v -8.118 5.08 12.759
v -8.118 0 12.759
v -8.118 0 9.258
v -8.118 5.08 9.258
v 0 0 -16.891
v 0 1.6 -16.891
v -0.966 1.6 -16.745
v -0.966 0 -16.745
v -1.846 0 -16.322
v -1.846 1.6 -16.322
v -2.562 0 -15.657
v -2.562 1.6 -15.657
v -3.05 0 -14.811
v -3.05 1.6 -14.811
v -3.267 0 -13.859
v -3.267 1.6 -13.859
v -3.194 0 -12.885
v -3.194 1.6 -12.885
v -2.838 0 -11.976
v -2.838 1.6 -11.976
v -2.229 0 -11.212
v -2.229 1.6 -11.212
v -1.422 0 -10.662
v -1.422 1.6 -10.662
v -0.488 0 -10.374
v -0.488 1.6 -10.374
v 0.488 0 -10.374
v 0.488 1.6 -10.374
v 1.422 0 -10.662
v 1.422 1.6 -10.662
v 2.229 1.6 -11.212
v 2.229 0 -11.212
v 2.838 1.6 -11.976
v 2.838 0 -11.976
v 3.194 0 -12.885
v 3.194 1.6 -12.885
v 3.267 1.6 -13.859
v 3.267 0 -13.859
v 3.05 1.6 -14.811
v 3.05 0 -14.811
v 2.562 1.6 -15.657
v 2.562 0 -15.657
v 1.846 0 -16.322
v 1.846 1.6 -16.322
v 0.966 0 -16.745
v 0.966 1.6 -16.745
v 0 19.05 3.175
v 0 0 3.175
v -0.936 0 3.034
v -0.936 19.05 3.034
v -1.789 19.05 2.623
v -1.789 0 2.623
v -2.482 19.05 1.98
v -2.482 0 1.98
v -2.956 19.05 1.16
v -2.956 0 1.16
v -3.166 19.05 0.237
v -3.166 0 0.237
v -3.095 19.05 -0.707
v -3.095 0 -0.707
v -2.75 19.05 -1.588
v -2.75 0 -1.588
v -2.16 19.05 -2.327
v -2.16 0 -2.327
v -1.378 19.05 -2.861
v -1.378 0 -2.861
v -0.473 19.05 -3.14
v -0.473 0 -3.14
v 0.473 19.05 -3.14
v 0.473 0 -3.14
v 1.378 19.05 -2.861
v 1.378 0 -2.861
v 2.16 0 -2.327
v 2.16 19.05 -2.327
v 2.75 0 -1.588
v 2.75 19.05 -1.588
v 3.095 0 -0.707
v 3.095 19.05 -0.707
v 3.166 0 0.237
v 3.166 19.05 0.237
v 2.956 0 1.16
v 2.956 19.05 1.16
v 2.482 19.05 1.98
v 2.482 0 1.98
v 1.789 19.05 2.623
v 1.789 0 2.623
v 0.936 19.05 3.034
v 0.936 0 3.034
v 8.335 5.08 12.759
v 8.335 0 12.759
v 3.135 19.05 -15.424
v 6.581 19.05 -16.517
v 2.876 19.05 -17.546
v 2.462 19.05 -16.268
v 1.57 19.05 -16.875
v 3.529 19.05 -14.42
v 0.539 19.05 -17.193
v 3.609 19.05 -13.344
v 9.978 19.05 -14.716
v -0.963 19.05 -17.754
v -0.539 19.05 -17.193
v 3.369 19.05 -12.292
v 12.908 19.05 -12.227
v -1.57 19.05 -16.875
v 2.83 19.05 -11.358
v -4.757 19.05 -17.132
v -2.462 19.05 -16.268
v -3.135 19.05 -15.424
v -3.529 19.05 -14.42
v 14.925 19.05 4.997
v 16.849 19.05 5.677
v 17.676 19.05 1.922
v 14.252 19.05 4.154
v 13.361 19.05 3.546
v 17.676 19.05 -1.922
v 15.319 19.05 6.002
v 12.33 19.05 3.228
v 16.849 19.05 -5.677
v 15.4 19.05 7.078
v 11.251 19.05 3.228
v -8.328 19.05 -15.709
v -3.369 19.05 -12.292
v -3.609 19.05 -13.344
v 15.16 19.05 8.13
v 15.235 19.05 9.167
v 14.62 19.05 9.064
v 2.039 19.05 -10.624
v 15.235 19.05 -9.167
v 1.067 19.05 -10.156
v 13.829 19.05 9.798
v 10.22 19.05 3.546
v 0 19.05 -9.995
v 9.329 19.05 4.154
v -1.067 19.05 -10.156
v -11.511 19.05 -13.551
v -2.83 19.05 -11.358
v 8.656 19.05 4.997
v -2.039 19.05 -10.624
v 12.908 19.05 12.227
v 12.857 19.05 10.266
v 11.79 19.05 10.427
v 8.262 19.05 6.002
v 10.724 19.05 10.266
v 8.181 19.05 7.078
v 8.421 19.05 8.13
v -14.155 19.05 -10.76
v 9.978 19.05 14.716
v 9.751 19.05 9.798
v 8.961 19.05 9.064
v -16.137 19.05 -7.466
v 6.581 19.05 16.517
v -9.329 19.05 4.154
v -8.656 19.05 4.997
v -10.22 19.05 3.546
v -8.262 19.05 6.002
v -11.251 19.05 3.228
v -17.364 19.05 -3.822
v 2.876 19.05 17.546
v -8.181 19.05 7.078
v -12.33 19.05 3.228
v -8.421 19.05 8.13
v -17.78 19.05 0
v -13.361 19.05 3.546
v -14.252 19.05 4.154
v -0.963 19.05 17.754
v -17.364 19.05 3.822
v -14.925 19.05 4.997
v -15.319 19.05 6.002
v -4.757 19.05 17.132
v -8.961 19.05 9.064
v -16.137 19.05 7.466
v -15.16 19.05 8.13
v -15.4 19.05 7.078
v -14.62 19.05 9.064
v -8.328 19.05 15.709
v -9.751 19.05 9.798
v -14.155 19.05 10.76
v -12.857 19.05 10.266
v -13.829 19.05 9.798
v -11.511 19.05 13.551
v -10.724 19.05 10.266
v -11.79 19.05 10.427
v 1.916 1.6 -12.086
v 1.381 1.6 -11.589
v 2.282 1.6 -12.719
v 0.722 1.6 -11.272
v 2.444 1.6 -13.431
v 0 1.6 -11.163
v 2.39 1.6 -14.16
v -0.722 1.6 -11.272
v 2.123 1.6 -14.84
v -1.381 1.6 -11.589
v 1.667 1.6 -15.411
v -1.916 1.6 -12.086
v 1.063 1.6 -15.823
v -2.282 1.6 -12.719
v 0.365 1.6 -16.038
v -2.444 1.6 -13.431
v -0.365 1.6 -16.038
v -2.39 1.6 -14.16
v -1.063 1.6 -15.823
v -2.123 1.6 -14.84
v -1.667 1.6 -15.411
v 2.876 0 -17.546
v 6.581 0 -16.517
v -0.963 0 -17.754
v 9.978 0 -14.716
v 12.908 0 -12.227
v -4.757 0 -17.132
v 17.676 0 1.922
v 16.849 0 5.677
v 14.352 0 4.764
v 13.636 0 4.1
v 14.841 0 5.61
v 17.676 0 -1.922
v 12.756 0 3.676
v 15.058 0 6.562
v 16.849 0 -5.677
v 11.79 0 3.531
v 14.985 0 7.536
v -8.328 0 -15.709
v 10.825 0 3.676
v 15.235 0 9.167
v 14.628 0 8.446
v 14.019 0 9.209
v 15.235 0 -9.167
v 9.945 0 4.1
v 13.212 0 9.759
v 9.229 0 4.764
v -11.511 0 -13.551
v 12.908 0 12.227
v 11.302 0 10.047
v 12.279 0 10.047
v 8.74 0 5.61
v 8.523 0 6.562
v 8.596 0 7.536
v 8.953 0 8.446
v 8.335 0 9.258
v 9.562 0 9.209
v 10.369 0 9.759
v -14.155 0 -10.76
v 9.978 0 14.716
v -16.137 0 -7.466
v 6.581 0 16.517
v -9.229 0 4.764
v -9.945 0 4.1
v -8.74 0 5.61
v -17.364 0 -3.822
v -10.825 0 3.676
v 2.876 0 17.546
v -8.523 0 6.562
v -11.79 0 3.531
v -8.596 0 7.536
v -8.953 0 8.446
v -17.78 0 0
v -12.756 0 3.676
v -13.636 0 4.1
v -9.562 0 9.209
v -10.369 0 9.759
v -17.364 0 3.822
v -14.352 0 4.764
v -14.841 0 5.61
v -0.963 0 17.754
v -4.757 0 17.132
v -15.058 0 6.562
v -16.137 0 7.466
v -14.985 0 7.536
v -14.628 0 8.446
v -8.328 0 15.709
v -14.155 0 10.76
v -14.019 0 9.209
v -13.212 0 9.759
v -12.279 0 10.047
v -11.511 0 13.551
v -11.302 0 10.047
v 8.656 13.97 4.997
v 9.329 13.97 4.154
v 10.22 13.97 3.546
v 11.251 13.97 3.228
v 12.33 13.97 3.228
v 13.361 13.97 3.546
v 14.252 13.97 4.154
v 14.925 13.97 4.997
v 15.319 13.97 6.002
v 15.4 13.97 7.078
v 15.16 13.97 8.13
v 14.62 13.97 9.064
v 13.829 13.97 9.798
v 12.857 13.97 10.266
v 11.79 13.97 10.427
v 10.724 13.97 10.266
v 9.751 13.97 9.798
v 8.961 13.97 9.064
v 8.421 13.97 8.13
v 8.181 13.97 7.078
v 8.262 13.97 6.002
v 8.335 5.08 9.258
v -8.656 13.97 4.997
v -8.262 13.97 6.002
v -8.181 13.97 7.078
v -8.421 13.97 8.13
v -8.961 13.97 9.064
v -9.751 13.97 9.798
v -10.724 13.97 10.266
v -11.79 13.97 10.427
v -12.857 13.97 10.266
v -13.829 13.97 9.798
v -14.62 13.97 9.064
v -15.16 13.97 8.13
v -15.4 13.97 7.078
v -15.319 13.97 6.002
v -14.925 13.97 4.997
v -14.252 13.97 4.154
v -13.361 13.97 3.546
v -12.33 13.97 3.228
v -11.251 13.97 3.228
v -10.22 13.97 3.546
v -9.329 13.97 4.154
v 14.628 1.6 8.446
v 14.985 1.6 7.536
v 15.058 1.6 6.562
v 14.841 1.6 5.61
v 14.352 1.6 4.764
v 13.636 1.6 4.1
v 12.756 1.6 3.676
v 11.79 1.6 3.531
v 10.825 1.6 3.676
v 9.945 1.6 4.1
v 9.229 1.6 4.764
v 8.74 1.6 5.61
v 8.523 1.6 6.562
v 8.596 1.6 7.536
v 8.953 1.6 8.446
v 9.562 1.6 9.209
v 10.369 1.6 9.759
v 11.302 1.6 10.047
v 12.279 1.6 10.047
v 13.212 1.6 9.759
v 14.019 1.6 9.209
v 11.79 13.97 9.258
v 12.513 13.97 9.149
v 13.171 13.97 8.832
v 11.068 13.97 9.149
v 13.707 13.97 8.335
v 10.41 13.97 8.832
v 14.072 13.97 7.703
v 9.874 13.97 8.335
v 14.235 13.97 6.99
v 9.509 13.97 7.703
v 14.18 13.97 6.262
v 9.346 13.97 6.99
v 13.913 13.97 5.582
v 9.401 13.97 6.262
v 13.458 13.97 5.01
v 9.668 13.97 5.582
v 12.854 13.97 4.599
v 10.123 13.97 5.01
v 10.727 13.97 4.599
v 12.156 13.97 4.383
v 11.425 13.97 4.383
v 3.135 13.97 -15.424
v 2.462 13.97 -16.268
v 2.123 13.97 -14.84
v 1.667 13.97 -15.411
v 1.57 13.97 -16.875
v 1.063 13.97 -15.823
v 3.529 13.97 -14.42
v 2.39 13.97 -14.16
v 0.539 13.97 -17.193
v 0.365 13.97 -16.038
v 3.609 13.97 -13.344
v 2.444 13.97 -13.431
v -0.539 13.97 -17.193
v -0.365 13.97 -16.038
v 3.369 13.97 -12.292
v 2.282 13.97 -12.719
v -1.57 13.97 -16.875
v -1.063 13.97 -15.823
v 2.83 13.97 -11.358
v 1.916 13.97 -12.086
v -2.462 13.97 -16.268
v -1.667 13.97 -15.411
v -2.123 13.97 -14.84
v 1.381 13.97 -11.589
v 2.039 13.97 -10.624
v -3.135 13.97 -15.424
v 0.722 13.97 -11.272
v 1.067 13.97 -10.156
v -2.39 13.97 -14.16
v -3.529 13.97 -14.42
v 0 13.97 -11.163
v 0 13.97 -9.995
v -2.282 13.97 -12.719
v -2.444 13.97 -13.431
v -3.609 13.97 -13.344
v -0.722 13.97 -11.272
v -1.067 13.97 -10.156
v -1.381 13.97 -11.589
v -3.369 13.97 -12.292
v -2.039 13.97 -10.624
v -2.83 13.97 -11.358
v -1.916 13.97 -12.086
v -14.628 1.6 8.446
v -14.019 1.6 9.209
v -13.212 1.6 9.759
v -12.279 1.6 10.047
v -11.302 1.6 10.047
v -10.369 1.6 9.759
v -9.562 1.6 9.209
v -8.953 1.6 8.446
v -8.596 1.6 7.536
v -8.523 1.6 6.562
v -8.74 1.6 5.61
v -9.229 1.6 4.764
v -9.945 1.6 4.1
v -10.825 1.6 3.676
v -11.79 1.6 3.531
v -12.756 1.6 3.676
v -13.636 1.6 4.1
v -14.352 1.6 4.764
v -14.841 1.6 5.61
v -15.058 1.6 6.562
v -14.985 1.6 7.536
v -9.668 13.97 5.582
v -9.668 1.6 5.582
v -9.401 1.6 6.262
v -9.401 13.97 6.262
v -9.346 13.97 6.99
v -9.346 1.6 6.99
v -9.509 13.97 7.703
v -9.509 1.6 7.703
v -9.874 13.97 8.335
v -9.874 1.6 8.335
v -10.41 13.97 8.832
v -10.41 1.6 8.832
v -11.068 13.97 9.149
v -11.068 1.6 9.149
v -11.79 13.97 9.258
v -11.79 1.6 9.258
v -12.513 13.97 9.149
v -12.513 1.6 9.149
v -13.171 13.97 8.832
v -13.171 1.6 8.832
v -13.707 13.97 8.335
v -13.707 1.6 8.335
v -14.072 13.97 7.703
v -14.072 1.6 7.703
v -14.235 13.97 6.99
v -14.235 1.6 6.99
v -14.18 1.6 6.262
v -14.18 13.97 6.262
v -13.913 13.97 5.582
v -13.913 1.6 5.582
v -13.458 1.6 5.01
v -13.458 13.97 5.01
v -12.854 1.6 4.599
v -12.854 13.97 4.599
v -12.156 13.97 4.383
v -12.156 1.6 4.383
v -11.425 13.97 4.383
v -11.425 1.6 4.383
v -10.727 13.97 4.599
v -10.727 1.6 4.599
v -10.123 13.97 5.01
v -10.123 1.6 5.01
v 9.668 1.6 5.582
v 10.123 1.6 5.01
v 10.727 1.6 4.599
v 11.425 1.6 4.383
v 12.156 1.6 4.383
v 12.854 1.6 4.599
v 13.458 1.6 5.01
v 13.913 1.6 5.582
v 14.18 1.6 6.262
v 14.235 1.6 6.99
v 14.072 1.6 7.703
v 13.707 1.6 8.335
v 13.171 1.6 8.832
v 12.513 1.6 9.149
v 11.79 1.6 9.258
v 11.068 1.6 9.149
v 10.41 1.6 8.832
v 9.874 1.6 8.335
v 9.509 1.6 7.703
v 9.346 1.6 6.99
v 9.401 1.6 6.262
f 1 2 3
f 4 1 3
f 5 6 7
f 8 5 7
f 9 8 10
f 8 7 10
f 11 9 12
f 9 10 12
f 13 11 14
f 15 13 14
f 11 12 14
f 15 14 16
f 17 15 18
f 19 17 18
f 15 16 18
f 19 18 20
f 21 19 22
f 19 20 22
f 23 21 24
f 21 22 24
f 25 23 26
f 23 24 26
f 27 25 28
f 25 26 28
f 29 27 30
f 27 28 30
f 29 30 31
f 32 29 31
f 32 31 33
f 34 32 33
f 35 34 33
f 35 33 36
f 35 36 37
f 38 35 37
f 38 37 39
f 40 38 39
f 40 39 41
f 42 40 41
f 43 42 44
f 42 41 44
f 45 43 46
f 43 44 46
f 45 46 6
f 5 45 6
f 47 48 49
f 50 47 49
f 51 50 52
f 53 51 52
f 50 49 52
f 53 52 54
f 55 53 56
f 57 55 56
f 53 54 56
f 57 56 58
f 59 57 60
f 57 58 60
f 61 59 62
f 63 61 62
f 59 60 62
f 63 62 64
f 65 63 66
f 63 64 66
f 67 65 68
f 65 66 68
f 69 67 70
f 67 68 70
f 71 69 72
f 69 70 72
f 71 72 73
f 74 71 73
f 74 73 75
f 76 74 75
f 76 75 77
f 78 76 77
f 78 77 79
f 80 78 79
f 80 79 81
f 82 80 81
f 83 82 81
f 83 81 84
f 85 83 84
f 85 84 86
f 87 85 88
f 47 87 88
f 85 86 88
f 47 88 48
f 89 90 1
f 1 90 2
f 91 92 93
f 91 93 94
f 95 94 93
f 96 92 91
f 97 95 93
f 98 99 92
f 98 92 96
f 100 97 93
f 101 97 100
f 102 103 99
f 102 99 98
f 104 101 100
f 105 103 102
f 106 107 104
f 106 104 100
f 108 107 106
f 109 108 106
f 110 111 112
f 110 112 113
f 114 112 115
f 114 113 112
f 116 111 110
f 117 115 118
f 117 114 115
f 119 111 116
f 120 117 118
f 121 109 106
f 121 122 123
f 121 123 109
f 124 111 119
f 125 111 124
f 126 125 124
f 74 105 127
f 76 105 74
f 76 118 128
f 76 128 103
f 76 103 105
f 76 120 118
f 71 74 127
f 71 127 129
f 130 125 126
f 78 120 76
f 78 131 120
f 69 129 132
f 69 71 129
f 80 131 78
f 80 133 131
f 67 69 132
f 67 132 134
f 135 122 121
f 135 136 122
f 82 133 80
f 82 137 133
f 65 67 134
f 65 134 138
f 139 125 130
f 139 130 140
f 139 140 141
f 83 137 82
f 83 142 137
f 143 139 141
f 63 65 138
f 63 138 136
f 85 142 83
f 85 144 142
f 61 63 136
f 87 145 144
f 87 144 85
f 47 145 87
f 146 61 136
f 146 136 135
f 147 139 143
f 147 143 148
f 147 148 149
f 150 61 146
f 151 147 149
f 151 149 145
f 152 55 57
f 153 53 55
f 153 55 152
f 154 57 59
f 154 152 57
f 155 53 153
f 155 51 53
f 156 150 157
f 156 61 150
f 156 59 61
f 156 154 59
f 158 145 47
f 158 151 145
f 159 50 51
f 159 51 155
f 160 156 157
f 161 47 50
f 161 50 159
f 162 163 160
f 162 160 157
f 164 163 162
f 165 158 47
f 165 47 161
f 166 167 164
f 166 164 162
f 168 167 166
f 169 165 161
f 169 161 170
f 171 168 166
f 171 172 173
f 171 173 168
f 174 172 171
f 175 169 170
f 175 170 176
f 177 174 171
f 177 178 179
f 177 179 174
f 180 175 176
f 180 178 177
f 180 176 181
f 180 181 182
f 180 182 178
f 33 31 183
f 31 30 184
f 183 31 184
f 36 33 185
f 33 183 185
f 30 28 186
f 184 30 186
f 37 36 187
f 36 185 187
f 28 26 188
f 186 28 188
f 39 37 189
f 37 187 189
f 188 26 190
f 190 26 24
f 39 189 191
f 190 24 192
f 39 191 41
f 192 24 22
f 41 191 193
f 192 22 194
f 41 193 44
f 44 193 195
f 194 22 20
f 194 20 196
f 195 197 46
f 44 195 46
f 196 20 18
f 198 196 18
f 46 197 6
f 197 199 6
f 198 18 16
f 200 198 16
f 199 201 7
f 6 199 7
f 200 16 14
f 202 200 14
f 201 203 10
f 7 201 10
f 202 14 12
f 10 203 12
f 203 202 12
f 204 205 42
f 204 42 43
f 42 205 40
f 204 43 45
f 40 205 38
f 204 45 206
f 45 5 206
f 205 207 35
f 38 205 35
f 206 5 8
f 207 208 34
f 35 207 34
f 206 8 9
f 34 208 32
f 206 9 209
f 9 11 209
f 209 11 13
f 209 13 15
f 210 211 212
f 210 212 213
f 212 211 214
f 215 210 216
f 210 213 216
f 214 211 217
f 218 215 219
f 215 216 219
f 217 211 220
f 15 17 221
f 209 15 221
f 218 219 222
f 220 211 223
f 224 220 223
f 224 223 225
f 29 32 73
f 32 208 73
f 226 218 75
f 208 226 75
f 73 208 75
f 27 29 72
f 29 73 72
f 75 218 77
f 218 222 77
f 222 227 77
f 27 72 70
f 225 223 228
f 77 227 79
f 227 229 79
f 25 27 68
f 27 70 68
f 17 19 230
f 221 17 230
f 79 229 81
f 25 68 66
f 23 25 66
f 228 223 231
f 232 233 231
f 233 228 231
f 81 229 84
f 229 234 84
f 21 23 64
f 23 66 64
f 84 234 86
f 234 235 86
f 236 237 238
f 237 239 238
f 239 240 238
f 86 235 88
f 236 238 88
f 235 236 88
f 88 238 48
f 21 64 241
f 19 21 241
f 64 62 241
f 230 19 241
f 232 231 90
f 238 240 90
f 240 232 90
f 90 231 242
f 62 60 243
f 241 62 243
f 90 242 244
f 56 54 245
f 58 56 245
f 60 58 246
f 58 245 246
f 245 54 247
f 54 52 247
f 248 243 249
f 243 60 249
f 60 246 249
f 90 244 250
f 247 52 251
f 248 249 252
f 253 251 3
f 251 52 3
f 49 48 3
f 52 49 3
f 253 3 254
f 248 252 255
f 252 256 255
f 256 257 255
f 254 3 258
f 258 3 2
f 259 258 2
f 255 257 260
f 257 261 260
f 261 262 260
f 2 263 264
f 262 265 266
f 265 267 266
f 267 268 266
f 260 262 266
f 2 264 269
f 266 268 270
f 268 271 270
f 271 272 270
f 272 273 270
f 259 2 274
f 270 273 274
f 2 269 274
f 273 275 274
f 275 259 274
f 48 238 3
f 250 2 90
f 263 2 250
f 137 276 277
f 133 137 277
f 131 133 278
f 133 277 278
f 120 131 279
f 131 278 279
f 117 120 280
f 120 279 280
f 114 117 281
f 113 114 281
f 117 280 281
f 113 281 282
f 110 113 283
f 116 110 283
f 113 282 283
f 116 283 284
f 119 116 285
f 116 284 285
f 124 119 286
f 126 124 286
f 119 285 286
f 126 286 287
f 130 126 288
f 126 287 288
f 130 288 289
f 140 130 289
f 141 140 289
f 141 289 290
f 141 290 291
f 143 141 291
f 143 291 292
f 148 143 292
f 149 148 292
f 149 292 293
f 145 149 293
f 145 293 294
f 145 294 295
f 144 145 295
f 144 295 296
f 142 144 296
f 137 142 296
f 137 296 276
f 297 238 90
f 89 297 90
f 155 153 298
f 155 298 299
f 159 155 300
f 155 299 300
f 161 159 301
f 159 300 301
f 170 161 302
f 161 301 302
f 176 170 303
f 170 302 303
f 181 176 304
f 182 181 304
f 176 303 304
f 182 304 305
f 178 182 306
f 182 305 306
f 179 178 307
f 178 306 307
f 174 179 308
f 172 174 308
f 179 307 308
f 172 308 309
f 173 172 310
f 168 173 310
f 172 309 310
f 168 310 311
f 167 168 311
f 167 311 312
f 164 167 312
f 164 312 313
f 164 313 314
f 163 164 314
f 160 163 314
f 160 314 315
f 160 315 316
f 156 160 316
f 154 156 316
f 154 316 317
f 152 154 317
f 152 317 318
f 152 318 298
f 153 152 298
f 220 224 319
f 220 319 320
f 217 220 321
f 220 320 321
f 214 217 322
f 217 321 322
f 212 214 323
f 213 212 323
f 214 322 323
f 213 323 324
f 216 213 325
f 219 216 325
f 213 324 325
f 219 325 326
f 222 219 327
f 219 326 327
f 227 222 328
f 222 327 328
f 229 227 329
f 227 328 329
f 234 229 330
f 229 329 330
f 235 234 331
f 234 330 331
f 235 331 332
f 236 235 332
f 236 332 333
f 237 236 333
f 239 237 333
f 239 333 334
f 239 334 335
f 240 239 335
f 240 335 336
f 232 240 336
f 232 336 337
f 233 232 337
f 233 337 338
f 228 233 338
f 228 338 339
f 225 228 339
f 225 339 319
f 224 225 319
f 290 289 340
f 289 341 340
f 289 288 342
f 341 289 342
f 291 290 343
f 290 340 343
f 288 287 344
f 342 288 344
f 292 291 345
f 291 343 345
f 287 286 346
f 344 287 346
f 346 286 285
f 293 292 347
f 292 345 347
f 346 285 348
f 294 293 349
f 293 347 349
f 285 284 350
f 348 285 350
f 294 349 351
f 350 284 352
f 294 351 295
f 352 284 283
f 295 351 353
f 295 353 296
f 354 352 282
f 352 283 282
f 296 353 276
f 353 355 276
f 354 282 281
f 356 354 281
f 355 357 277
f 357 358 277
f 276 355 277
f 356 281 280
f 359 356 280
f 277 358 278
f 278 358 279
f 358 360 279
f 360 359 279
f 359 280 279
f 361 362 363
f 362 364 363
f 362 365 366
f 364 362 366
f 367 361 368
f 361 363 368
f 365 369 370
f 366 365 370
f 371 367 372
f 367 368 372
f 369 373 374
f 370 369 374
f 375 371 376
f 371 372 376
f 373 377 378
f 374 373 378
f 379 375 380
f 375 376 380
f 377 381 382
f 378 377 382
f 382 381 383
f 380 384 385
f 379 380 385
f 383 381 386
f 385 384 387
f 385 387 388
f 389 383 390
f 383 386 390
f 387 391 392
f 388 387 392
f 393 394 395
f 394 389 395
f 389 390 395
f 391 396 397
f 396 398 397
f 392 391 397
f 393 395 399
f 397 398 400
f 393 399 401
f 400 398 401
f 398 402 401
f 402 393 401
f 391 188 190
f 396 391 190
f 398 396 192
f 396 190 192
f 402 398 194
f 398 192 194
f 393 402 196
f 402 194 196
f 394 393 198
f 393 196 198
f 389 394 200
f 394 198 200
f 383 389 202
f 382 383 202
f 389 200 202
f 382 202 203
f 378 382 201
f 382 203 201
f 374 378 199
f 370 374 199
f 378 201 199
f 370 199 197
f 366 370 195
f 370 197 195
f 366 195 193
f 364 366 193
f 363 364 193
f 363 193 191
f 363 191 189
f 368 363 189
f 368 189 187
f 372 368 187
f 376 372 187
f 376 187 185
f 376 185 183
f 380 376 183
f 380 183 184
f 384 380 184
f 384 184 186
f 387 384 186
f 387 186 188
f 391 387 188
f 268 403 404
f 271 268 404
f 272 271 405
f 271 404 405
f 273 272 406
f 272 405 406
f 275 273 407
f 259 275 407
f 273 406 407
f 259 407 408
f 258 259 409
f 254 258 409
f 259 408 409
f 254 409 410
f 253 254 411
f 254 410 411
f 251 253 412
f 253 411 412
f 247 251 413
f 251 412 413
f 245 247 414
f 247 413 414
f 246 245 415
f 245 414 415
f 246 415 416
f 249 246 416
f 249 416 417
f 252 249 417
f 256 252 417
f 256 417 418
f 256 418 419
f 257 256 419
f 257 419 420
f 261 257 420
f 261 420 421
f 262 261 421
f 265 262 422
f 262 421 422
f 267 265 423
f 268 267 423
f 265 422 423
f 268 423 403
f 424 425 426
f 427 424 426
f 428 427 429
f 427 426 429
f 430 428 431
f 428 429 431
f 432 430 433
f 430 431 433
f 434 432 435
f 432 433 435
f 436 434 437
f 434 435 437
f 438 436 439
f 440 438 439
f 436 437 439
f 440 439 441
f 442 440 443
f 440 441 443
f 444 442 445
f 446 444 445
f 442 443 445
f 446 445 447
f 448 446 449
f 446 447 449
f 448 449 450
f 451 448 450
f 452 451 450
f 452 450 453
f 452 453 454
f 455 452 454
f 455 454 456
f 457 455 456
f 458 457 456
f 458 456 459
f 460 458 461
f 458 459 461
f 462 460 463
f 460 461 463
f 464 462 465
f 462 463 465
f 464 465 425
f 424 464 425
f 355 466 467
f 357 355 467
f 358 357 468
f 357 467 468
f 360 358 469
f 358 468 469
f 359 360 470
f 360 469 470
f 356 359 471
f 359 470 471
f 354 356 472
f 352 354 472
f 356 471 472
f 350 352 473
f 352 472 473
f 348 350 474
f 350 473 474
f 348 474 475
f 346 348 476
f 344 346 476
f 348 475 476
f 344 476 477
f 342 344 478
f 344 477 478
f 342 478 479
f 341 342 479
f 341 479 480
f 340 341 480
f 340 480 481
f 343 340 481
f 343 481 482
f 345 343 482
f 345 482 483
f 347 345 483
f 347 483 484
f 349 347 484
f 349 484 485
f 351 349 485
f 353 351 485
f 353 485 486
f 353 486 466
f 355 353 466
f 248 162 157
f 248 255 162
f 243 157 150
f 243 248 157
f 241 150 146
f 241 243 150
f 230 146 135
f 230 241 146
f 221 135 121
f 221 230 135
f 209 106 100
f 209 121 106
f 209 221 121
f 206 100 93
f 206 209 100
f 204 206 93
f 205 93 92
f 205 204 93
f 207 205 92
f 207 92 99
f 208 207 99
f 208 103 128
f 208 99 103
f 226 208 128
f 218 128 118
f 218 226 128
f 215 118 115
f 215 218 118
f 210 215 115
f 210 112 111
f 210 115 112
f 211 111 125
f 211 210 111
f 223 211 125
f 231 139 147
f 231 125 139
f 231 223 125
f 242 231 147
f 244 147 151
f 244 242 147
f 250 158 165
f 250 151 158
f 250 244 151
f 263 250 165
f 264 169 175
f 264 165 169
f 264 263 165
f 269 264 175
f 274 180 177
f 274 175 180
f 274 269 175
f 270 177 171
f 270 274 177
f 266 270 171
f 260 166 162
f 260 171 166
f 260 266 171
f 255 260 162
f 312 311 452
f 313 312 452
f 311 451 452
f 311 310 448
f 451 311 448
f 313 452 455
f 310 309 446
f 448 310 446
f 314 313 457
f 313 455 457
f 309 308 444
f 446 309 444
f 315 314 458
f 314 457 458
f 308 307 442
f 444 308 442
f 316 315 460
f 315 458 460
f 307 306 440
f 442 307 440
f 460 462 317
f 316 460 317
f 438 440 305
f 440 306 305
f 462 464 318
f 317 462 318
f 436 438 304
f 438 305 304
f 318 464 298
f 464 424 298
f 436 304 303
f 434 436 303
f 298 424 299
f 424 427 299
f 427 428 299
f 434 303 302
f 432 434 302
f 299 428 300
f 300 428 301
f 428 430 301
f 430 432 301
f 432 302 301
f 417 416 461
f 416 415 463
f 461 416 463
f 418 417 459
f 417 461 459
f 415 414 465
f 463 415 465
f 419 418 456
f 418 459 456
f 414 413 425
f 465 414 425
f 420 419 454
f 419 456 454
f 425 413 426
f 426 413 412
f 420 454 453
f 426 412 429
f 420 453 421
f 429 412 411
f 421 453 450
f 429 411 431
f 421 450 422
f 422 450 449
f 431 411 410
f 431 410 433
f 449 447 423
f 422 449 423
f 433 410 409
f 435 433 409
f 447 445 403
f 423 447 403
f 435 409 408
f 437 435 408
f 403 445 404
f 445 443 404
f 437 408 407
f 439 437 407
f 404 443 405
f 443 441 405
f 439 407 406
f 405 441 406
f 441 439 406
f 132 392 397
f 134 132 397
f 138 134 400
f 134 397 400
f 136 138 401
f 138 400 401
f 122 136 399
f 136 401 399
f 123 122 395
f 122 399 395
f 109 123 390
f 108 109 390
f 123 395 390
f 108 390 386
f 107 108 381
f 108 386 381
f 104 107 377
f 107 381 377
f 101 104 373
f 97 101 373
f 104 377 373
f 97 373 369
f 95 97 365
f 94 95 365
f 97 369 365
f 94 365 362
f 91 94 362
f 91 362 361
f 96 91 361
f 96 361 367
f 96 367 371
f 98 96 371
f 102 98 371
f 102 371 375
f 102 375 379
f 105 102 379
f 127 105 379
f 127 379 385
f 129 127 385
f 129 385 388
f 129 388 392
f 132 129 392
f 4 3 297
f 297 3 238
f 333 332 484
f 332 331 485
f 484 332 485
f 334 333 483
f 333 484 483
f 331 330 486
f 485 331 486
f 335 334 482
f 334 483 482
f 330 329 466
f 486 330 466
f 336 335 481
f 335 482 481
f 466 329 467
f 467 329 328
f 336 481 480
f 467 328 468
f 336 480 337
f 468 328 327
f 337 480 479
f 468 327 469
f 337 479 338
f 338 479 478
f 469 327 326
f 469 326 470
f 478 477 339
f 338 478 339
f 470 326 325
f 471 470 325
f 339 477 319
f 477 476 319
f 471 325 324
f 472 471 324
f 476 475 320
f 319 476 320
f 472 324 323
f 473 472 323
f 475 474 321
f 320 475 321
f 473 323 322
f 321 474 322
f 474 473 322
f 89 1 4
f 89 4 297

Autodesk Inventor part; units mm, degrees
ref_plane "YZ Plane" through (0, 0, 0) normal (1, 0, 0) x (0, 1, 0)
ref_plane "XZ Plane" through (0, 0, 0) normal (0, 1, 0) x (-1, 0, 0)
ref_plane "XY Plane" through (0, 0, 0) normal (0, 0, 1) x (1, 0, 0)
sketch "Sketch1" plane through (0, 0, 0) normal (0, 1, 0) x (-1, 0, 0)
  line L0 (0, 0) -> (13.6144, 0)
  circle A0 centre (0, 0) radius 17.78
  dimension "d0" = 13.6144
  dimension "d1" = 35.56
extrude "Extrusion1" add sketch "Sketch1" along normal blind 19.05
sketch "Sketch3" plane through (0, 19.05, 0) normal (0, 1, 0) x (1, 0, 0)
  line L0 (0, 0) -> (0, 13.6144)
  line L1 (0, 0) -> (13.6144, 0) construction
  dimension "d4" = 13.6144
  dimension "d5" = 90
hole "Hole1" at (0, 19.05, -13.6144) direction (0, -1, 0) diameter 4.9022 end through all counterbore diameter 7.239 counterbore depth 5.08
sketch "Sketch4" plane through (0, 0, 0) normal (0, -1, 0) x (1, 0, 0)
  circle A0 centre (0, -13.6144) radius 2.4511 projected
  line L0 (0, 0) -> (0, -13.6144)
hole "Hole2" at (0, 0, -13.6144) direction (0, 1, 0) diameter 4.9022 depth 6.35 counterbore diameter 6.5532 counterbore depth 1.6002
pattern_circular "Circular Pattern1" count 3 over 360 about axis through (0, 0, 0) along (0, 1, 0) of "Hole1", "Hole2"
sketch "Sketch6" plane through (0, 19.05, 0) normal (0, 1, 0) x (1, 0, 0)
  point P0 (0, 0)
  point P1 (0, 0)
hole "Hole3" at (0, 19.05, 0) direction (0, -1, 0) diameter 6.35 end through all
sketch "Sketch10" plane through (0, 0, 0) normal (0, -1, 0) x (1, 0, 0)
  circle A0 centre (0, 0) radius 15.24
  circle A1 centre (11.7904, 6.8072) radius 2.4511 projected
  circle A2 centre (-11.7904, 6.8072) radius 2.4511 projected
  line L0 (11.7904, 6.8072) -> (-11.7904, 6.8072)
  line L1 (8.3352, 12.7586) -> (-8.1178, 12.7586)
  line L2 (-8.1178, 12.7586) -> (-8.1178, 9.2583)
  line L3 (-8.1178, 9.2583) -> (8.3352, 9.2583)
  line L4 (8.3352, 9.2583) -> (8.3352, 12.7586)
  dimension "d38" = 30.48
extrude "Extrusion2" cut sketch "Sketch10" against normal blind 5.08 contours L4 L3 L2 L1
properties part number "tablecut"
